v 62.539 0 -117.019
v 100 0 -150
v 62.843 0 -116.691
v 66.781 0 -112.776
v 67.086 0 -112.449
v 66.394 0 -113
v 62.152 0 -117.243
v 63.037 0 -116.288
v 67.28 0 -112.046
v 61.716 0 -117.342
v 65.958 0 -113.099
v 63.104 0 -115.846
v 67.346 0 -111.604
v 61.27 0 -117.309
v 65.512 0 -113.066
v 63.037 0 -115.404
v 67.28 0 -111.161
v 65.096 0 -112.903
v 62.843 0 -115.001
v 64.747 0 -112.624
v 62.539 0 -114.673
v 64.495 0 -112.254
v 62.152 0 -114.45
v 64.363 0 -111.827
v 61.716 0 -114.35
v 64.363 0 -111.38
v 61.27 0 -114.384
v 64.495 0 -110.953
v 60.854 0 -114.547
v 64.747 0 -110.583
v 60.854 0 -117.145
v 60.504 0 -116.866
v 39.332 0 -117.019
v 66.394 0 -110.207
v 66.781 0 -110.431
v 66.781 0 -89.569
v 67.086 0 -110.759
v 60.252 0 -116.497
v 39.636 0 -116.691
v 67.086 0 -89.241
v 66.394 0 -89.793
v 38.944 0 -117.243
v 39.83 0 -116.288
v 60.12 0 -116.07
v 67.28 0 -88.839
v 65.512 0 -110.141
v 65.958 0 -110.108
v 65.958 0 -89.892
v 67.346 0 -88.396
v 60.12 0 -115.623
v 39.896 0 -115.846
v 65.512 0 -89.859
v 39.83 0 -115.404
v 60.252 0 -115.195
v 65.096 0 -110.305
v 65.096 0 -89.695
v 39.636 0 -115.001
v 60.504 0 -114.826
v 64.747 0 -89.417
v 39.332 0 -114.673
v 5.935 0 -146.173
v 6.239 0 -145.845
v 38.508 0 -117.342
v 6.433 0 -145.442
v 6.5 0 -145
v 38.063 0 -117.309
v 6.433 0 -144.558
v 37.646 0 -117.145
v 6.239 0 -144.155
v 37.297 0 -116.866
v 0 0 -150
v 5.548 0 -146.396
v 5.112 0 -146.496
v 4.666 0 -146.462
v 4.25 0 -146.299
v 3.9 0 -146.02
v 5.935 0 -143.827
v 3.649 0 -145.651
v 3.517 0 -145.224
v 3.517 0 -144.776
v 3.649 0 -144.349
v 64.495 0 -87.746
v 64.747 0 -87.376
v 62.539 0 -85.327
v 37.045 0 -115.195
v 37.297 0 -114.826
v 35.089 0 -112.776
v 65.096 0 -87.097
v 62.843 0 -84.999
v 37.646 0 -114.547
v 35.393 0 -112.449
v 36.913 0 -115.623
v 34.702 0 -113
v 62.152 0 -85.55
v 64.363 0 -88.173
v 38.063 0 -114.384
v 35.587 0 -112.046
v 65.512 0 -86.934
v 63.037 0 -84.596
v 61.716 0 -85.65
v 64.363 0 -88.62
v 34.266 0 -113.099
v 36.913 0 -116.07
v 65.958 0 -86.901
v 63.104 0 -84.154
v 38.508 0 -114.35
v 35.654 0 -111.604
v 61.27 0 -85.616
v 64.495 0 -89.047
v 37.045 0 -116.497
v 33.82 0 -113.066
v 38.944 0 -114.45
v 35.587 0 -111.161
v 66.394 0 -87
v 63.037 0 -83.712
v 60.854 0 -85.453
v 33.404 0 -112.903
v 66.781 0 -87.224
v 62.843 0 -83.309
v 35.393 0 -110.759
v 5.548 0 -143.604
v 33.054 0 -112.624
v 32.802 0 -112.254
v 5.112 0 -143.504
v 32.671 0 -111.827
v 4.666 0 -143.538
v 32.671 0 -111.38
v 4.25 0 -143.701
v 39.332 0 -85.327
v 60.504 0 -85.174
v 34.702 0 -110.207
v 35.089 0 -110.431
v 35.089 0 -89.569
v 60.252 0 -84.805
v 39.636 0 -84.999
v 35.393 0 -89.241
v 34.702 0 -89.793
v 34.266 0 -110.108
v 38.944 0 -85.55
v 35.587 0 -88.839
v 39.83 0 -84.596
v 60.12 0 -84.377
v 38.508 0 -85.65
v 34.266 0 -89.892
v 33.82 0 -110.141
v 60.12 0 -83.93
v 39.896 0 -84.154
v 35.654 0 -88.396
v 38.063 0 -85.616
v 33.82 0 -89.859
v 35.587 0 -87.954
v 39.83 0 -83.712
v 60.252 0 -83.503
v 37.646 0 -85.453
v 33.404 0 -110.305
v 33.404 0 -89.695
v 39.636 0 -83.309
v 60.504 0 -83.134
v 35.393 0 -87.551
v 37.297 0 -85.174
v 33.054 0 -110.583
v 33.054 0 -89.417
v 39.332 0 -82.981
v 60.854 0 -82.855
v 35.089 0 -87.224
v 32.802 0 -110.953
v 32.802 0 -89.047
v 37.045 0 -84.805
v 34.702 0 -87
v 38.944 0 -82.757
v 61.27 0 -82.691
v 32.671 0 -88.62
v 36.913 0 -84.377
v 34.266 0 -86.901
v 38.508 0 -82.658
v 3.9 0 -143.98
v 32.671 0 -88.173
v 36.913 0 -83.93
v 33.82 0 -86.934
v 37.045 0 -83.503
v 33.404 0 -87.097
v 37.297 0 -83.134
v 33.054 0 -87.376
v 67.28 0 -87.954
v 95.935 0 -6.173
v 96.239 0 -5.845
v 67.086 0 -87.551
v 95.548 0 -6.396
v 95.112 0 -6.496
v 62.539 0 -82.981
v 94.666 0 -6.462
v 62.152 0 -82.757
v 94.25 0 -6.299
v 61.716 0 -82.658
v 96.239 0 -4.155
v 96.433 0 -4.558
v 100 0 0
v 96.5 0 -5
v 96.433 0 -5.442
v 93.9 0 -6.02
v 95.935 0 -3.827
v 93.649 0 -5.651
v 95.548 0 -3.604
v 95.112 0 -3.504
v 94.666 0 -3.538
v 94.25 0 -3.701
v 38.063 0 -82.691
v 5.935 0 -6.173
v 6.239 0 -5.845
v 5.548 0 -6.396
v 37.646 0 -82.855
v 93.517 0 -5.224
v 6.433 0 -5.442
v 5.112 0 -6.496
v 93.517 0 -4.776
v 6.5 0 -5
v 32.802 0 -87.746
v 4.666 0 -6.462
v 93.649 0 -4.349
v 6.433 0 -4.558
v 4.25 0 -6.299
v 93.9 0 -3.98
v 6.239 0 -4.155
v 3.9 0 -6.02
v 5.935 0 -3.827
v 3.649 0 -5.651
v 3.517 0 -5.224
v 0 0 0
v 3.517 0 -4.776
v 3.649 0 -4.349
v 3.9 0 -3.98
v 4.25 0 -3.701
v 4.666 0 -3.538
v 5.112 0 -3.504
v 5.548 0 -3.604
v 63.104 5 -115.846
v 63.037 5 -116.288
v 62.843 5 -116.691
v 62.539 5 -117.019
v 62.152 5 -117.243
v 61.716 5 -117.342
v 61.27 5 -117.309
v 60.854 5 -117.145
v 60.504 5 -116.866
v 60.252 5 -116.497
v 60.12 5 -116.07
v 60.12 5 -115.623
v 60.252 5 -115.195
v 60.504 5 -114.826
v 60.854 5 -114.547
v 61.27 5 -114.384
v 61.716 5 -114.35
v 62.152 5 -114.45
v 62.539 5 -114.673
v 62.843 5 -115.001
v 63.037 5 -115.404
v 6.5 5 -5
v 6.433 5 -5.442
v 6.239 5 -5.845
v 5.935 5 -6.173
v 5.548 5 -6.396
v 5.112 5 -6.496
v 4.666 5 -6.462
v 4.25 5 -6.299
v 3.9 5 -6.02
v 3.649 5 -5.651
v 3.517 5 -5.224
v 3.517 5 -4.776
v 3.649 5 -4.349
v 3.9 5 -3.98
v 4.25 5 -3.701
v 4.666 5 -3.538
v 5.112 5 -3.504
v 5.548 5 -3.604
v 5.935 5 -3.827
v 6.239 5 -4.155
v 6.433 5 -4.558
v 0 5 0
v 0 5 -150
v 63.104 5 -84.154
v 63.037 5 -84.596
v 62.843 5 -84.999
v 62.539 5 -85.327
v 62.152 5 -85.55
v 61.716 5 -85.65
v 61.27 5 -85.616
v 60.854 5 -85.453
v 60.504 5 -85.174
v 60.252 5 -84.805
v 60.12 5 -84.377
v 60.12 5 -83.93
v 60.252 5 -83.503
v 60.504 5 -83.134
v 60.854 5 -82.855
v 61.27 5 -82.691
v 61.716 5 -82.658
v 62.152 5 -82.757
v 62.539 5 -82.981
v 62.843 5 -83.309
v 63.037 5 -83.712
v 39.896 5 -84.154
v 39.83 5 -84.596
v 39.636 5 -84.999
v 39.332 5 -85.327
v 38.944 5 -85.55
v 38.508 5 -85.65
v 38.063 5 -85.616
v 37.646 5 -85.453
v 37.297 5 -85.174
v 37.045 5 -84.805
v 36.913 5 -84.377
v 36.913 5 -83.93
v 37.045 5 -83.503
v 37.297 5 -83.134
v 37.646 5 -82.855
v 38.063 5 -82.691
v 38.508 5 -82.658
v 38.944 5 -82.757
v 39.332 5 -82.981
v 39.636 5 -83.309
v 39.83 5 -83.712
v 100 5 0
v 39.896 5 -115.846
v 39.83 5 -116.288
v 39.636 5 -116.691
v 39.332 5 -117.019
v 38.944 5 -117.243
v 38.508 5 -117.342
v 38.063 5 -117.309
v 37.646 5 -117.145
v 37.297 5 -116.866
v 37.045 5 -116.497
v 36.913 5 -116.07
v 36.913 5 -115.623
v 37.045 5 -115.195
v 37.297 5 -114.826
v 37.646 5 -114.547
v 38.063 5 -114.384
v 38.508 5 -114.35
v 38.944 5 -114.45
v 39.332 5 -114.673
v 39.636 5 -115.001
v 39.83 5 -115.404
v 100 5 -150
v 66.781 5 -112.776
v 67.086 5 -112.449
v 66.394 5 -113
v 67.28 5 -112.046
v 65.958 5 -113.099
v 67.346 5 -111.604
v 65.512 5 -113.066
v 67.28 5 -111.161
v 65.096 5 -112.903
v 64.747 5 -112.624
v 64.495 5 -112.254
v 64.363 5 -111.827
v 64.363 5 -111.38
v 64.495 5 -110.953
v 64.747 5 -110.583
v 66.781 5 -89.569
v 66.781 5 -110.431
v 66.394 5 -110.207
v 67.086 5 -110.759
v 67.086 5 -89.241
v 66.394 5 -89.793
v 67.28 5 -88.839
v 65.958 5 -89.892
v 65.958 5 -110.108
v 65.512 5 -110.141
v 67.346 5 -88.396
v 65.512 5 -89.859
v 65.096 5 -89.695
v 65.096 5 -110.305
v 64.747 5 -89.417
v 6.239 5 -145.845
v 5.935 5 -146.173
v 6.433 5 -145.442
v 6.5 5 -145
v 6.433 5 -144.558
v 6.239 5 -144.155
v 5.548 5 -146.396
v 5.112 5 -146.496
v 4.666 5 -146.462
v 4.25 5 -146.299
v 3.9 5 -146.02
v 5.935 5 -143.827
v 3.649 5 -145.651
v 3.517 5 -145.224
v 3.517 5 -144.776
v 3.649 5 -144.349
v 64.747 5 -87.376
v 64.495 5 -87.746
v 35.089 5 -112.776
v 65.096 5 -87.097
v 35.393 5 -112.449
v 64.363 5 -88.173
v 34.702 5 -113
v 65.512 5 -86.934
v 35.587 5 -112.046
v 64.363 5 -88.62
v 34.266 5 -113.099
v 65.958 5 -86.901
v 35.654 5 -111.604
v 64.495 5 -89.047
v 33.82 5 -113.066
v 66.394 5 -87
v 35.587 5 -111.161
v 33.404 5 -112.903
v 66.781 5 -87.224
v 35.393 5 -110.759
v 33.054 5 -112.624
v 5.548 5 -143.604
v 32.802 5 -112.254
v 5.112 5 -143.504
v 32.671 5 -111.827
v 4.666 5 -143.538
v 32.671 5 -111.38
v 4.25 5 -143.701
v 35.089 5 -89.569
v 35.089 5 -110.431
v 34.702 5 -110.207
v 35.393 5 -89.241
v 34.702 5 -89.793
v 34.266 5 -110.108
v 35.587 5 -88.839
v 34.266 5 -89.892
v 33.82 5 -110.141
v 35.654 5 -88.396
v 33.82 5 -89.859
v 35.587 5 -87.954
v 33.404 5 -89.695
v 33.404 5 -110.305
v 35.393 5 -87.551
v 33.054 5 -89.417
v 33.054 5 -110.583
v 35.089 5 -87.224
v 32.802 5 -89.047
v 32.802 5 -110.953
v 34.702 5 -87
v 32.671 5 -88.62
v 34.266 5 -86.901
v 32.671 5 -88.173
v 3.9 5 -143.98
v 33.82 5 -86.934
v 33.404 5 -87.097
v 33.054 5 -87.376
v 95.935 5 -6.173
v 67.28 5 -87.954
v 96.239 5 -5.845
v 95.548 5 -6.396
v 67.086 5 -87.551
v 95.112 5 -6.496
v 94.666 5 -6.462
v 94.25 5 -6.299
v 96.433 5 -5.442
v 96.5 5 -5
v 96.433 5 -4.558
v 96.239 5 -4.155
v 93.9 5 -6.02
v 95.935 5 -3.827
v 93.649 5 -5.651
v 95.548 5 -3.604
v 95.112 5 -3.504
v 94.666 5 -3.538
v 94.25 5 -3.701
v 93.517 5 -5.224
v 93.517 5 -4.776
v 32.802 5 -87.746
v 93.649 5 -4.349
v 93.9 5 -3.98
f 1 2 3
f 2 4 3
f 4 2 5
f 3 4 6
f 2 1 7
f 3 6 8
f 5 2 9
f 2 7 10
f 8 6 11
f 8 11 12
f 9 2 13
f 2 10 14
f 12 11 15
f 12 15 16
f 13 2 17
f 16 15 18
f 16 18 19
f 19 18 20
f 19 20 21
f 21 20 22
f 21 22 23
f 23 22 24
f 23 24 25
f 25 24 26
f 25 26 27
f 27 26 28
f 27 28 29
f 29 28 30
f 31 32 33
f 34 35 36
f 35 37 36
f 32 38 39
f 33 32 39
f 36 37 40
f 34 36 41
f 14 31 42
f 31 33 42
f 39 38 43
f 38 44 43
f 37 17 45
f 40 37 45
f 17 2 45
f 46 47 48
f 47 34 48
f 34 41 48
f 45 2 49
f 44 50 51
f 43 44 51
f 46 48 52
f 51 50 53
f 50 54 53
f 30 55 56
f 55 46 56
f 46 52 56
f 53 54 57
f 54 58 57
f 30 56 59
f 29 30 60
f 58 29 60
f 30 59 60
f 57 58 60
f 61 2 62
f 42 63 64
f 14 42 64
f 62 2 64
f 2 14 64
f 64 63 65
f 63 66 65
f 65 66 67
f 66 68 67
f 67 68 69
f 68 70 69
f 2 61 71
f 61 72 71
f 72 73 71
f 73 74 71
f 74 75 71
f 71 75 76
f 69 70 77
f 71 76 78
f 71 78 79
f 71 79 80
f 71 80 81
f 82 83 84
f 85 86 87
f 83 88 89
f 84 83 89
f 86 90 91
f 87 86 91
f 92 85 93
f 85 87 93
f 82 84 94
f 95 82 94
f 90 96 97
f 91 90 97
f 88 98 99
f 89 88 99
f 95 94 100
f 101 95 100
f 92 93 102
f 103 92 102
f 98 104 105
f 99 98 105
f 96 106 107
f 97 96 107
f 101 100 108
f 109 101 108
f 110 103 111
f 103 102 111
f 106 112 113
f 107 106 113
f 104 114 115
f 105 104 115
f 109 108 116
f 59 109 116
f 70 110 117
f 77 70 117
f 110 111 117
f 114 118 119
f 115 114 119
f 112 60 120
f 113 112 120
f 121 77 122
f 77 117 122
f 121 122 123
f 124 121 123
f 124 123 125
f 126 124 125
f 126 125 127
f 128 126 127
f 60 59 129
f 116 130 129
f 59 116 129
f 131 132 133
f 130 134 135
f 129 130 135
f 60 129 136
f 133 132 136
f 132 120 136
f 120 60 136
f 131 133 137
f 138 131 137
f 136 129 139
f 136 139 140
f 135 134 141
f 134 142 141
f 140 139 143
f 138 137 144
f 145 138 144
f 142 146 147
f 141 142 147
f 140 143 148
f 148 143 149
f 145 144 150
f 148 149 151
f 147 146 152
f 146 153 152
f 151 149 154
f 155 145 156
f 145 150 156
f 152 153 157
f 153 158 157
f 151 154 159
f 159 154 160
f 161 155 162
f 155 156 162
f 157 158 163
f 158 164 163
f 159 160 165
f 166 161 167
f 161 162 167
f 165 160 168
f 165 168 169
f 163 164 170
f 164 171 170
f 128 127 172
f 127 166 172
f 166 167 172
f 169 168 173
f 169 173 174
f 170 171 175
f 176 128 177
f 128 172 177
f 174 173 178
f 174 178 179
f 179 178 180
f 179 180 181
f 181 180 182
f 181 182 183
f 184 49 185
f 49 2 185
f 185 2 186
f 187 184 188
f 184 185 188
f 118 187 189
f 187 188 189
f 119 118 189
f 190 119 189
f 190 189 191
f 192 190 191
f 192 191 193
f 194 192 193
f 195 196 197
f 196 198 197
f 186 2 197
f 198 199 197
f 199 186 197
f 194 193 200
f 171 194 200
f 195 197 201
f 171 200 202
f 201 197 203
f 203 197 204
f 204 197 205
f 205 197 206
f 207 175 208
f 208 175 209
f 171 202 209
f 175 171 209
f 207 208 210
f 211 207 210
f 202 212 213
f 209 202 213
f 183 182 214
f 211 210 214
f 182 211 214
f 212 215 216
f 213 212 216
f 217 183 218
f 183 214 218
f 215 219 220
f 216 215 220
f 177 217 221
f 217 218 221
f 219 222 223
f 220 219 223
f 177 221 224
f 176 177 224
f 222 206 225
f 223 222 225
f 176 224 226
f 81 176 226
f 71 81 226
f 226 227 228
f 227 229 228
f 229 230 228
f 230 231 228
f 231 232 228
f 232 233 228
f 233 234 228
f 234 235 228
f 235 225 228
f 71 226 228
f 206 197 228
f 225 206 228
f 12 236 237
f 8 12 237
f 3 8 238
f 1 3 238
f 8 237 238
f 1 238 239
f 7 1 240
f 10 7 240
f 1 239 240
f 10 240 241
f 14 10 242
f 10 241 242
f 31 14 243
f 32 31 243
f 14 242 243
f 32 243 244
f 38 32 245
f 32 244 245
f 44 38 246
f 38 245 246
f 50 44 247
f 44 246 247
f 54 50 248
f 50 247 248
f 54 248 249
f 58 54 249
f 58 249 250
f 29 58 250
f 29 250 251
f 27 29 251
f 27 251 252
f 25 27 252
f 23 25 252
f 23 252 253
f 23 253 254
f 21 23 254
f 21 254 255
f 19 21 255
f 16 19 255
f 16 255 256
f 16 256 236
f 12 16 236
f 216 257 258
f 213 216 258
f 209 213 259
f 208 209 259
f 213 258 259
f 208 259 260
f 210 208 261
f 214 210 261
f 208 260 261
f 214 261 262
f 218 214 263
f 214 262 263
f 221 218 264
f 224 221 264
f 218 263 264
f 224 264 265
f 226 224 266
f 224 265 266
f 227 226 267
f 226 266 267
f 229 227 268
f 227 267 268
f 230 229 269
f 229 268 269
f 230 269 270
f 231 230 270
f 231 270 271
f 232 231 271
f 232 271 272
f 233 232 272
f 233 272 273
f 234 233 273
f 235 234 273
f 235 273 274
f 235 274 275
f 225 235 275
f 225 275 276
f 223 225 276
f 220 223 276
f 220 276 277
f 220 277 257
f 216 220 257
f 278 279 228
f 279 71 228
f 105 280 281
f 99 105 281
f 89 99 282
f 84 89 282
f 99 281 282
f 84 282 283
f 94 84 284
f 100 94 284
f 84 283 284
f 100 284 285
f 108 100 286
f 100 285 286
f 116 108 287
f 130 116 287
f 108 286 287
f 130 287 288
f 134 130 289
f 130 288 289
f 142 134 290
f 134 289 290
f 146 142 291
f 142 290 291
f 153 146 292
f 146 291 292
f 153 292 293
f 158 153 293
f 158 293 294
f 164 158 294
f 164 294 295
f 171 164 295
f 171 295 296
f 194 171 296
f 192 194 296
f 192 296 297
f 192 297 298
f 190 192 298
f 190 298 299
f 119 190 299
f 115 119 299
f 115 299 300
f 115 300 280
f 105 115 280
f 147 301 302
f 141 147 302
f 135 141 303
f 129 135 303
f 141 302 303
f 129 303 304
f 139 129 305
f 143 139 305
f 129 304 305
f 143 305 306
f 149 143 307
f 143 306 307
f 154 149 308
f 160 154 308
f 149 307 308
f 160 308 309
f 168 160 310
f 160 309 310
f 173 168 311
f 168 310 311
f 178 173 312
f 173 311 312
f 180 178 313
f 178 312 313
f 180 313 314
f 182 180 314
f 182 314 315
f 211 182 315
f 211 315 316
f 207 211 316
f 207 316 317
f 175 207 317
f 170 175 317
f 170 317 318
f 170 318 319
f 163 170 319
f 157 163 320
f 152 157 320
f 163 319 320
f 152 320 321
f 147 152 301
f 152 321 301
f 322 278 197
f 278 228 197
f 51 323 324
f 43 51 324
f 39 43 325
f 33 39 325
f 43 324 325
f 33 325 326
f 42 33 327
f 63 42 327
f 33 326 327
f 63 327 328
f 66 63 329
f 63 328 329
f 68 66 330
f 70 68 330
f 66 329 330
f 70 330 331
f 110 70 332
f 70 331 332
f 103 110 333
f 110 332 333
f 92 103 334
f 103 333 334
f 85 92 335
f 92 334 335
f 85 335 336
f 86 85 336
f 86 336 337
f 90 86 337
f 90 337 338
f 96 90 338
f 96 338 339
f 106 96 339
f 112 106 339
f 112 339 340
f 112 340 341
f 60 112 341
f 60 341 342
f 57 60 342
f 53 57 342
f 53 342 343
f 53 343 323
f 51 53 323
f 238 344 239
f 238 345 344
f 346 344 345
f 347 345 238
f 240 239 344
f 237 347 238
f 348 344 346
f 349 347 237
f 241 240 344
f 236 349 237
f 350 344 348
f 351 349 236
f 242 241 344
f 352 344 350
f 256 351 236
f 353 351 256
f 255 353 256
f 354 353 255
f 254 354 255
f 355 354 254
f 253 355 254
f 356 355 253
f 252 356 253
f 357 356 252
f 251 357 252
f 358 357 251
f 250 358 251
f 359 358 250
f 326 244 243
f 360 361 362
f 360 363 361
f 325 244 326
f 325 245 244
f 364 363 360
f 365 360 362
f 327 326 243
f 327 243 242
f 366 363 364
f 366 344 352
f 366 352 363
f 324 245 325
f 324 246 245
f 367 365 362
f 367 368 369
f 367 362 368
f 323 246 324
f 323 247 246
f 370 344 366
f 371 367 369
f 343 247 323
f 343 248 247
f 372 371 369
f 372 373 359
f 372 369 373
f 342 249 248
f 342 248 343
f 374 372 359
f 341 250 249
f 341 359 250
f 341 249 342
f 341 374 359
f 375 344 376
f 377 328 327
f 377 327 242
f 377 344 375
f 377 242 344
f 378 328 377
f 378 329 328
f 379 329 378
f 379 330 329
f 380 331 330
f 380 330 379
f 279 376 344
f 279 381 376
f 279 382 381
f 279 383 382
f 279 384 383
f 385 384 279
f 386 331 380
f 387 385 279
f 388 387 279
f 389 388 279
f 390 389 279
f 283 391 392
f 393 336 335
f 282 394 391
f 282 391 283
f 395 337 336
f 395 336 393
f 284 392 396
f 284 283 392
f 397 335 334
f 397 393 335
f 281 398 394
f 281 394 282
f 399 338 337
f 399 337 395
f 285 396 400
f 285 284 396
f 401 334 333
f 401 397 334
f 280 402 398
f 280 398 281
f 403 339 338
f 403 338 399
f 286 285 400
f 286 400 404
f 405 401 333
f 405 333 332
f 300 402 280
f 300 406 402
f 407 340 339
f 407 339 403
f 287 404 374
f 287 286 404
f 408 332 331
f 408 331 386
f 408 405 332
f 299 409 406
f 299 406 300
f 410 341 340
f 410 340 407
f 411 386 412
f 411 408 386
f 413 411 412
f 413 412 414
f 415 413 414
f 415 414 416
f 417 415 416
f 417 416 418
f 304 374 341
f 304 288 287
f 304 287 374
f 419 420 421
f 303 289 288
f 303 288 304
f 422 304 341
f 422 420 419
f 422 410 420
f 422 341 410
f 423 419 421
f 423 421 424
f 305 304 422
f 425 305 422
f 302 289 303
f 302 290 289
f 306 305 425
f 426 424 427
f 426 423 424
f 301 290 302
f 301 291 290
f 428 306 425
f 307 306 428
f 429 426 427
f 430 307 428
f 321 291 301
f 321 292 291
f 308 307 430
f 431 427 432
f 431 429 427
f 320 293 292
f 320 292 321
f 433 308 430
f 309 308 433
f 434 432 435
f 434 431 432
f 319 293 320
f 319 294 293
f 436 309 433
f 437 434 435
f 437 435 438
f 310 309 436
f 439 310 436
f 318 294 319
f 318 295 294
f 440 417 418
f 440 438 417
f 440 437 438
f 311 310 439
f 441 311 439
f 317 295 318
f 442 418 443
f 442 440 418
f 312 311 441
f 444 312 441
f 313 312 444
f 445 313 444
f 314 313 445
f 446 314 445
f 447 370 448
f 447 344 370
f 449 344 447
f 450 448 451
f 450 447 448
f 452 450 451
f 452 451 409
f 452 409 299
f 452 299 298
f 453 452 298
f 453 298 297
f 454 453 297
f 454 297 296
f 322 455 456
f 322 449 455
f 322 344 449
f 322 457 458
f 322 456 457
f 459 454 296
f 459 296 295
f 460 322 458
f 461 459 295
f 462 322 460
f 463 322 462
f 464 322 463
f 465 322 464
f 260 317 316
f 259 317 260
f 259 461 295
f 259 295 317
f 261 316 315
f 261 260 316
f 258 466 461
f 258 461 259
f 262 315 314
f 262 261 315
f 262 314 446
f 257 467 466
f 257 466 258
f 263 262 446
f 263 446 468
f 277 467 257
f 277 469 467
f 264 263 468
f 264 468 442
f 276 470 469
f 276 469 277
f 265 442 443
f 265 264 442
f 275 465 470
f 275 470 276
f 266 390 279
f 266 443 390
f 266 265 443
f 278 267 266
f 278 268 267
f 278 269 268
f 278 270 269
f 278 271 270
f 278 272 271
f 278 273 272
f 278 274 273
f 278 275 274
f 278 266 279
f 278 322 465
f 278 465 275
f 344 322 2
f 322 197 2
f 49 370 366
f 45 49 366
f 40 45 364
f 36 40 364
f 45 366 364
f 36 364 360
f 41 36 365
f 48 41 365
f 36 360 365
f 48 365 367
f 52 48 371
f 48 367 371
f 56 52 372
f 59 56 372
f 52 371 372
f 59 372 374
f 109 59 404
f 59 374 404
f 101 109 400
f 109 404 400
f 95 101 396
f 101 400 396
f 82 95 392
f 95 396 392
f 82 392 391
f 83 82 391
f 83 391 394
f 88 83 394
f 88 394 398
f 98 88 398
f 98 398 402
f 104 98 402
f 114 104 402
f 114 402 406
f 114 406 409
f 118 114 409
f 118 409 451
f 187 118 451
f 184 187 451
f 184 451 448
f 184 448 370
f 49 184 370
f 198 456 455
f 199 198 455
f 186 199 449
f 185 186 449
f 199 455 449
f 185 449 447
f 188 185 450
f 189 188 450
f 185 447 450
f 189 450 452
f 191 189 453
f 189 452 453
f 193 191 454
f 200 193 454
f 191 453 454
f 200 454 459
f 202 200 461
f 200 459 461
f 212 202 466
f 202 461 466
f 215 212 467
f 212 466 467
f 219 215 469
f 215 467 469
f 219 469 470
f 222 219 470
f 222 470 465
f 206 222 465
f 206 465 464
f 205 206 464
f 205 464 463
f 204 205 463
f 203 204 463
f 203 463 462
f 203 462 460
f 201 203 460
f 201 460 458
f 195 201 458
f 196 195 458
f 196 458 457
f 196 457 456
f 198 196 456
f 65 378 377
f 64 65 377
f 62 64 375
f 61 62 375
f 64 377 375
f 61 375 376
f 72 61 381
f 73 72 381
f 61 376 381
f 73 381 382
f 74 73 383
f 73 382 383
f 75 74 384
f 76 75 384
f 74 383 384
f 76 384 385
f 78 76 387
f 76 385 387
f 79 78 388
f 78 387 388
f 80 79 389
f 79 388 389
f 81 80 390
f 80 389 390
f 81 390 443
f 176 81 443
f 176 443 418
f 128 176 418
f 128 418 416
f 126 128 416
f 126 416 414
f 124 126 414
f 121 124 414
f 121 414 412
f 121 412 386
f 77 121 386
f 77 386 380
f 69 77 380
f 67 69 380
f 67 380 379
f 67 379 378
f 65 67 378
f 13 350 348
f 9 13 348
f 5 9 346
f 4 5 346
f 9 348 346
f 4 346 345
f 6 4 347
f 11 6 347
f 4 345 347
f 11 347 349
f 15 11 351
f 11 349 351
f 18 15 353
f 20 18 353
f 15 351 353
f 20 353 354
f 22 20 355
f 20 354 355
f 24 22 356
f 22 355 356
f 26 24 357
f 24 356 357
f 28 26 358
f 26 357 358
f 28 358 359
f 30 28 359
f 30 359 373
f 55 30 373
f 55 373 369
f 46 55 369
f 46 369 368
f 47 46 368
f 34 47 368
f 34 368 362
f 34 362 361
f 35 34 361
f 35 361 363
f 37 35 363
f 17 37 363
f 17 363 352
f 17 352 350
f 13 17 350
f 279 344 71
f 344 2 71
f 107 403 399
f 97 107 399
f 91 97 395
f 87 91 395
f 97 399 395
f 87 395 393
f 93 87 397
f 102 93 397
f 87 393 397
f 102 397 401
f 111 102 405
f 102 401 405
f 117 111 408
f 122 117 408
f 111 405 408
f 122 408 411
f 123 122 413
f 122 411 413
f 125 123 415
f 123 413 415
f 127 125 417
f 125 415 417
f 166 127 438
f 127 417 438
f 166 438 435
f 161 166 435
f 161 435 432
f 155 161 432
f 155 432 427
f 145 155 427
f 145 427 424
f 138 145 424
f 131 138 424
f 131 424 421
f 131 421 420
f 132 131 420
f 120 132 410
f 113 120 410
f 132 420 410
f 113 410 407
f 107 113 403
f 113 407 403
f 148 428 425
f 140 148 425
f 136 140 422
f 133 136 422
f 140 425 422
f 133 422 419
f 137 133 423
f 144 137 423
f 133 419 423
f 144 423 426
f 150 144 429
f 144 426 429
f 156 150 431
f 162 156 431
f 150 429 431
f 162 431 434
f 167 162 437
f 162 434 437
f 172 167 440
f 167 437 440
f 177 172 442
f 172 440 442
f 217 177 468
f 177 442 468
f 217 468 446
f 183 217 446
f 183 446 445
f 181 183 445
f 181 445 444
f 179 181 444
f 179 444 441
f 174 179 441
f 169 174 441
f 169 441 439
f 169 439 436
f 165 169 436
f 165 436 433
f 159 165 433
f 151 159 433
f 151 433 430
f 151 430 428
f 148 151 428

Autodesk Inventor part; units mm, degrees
ref_plane "YZ Plane" through (0, 0, 0) normal (1, 0, 0) x (0, 1, 0)
ref_plane "XZ Plane" through (0, 0, 0) normal (0, 1, 0) x (-1, 0, 0)
ref_plane "XY Plane" through (0, 0, 0) normal (0, 0, 1) x (1, 0, 0)
sketch "Sketch1" plane through (0, 0, 0) normal (0, 1, 0) x (-1, 0, 0)
  line L0 (0, 0) -> (-100, 0)
  line L1 (-100, 0) -> (-100, -150)
  line L2 (-100, -150) -> (0, -150)
  line L3 (0, -150) -> (0, 0)
  dimension "d0" = 150
  dimension "d1" = 100
extrude "Extrusion1" add sketch "Sketch1" along normal blind 5
sketch "Sketch2" plane through (0, 5, 0) normal (0, 1, 0) x (1, 0, 0)
  circle A0 centre (65.8462, 111.6036) radius 1.5 projected
  circle A1 centre (61.6036, 115.8462) radius 1.5 projected
  circle A2 centre (38.3964, 115.8462) radius 1.5 projected
  circle A3 centre (34.1538, 111.6036) radius 1.5 projected
  circle A4 centre (34.1538, 88.3964) radius 1.5 projected
  circle A5 centre (38.3964, 84.1538) radius 1.5 projected
  circle A6 centre (61.6036, 84.1538) radius 1.5 projected
  circle A7 centre (65.8462, 88.3964) radius 1.5 projected
  point P0 (0, 0)
extrude "Extrusion2" cut sketch "Sketch2" against normal blind 5
sketch "Sketch3" plane through (0, 5, 0) normal (0, 1, 0) x (1, 0, 0)
  circle A0 centre (5, 145) radius 1.5 projected
  circle A1 centre (5, 5) radius 1.5 projected
  circle A2 centre (95, 5) radius 1.5 projected
  point P0 (0, 0)
extrude "Extrusion3" cut sketch "Sketch3" against normal blind 5
equation "\"d2\" = woodThickness"
equation "\"d4\" = woodThickness"
equation "\"d6\" = woodThickness"
equation "\"bladeLenghtFlexRatio\" = 0.05"
equation "\"bladeThickness\" = 1"
equation "\"woodThickness\" = 5"
equation "\"colRadius\" = 3"
equation "\"M3Hole\" = 3"
properties part number "FlexBlockWheelSupport"
